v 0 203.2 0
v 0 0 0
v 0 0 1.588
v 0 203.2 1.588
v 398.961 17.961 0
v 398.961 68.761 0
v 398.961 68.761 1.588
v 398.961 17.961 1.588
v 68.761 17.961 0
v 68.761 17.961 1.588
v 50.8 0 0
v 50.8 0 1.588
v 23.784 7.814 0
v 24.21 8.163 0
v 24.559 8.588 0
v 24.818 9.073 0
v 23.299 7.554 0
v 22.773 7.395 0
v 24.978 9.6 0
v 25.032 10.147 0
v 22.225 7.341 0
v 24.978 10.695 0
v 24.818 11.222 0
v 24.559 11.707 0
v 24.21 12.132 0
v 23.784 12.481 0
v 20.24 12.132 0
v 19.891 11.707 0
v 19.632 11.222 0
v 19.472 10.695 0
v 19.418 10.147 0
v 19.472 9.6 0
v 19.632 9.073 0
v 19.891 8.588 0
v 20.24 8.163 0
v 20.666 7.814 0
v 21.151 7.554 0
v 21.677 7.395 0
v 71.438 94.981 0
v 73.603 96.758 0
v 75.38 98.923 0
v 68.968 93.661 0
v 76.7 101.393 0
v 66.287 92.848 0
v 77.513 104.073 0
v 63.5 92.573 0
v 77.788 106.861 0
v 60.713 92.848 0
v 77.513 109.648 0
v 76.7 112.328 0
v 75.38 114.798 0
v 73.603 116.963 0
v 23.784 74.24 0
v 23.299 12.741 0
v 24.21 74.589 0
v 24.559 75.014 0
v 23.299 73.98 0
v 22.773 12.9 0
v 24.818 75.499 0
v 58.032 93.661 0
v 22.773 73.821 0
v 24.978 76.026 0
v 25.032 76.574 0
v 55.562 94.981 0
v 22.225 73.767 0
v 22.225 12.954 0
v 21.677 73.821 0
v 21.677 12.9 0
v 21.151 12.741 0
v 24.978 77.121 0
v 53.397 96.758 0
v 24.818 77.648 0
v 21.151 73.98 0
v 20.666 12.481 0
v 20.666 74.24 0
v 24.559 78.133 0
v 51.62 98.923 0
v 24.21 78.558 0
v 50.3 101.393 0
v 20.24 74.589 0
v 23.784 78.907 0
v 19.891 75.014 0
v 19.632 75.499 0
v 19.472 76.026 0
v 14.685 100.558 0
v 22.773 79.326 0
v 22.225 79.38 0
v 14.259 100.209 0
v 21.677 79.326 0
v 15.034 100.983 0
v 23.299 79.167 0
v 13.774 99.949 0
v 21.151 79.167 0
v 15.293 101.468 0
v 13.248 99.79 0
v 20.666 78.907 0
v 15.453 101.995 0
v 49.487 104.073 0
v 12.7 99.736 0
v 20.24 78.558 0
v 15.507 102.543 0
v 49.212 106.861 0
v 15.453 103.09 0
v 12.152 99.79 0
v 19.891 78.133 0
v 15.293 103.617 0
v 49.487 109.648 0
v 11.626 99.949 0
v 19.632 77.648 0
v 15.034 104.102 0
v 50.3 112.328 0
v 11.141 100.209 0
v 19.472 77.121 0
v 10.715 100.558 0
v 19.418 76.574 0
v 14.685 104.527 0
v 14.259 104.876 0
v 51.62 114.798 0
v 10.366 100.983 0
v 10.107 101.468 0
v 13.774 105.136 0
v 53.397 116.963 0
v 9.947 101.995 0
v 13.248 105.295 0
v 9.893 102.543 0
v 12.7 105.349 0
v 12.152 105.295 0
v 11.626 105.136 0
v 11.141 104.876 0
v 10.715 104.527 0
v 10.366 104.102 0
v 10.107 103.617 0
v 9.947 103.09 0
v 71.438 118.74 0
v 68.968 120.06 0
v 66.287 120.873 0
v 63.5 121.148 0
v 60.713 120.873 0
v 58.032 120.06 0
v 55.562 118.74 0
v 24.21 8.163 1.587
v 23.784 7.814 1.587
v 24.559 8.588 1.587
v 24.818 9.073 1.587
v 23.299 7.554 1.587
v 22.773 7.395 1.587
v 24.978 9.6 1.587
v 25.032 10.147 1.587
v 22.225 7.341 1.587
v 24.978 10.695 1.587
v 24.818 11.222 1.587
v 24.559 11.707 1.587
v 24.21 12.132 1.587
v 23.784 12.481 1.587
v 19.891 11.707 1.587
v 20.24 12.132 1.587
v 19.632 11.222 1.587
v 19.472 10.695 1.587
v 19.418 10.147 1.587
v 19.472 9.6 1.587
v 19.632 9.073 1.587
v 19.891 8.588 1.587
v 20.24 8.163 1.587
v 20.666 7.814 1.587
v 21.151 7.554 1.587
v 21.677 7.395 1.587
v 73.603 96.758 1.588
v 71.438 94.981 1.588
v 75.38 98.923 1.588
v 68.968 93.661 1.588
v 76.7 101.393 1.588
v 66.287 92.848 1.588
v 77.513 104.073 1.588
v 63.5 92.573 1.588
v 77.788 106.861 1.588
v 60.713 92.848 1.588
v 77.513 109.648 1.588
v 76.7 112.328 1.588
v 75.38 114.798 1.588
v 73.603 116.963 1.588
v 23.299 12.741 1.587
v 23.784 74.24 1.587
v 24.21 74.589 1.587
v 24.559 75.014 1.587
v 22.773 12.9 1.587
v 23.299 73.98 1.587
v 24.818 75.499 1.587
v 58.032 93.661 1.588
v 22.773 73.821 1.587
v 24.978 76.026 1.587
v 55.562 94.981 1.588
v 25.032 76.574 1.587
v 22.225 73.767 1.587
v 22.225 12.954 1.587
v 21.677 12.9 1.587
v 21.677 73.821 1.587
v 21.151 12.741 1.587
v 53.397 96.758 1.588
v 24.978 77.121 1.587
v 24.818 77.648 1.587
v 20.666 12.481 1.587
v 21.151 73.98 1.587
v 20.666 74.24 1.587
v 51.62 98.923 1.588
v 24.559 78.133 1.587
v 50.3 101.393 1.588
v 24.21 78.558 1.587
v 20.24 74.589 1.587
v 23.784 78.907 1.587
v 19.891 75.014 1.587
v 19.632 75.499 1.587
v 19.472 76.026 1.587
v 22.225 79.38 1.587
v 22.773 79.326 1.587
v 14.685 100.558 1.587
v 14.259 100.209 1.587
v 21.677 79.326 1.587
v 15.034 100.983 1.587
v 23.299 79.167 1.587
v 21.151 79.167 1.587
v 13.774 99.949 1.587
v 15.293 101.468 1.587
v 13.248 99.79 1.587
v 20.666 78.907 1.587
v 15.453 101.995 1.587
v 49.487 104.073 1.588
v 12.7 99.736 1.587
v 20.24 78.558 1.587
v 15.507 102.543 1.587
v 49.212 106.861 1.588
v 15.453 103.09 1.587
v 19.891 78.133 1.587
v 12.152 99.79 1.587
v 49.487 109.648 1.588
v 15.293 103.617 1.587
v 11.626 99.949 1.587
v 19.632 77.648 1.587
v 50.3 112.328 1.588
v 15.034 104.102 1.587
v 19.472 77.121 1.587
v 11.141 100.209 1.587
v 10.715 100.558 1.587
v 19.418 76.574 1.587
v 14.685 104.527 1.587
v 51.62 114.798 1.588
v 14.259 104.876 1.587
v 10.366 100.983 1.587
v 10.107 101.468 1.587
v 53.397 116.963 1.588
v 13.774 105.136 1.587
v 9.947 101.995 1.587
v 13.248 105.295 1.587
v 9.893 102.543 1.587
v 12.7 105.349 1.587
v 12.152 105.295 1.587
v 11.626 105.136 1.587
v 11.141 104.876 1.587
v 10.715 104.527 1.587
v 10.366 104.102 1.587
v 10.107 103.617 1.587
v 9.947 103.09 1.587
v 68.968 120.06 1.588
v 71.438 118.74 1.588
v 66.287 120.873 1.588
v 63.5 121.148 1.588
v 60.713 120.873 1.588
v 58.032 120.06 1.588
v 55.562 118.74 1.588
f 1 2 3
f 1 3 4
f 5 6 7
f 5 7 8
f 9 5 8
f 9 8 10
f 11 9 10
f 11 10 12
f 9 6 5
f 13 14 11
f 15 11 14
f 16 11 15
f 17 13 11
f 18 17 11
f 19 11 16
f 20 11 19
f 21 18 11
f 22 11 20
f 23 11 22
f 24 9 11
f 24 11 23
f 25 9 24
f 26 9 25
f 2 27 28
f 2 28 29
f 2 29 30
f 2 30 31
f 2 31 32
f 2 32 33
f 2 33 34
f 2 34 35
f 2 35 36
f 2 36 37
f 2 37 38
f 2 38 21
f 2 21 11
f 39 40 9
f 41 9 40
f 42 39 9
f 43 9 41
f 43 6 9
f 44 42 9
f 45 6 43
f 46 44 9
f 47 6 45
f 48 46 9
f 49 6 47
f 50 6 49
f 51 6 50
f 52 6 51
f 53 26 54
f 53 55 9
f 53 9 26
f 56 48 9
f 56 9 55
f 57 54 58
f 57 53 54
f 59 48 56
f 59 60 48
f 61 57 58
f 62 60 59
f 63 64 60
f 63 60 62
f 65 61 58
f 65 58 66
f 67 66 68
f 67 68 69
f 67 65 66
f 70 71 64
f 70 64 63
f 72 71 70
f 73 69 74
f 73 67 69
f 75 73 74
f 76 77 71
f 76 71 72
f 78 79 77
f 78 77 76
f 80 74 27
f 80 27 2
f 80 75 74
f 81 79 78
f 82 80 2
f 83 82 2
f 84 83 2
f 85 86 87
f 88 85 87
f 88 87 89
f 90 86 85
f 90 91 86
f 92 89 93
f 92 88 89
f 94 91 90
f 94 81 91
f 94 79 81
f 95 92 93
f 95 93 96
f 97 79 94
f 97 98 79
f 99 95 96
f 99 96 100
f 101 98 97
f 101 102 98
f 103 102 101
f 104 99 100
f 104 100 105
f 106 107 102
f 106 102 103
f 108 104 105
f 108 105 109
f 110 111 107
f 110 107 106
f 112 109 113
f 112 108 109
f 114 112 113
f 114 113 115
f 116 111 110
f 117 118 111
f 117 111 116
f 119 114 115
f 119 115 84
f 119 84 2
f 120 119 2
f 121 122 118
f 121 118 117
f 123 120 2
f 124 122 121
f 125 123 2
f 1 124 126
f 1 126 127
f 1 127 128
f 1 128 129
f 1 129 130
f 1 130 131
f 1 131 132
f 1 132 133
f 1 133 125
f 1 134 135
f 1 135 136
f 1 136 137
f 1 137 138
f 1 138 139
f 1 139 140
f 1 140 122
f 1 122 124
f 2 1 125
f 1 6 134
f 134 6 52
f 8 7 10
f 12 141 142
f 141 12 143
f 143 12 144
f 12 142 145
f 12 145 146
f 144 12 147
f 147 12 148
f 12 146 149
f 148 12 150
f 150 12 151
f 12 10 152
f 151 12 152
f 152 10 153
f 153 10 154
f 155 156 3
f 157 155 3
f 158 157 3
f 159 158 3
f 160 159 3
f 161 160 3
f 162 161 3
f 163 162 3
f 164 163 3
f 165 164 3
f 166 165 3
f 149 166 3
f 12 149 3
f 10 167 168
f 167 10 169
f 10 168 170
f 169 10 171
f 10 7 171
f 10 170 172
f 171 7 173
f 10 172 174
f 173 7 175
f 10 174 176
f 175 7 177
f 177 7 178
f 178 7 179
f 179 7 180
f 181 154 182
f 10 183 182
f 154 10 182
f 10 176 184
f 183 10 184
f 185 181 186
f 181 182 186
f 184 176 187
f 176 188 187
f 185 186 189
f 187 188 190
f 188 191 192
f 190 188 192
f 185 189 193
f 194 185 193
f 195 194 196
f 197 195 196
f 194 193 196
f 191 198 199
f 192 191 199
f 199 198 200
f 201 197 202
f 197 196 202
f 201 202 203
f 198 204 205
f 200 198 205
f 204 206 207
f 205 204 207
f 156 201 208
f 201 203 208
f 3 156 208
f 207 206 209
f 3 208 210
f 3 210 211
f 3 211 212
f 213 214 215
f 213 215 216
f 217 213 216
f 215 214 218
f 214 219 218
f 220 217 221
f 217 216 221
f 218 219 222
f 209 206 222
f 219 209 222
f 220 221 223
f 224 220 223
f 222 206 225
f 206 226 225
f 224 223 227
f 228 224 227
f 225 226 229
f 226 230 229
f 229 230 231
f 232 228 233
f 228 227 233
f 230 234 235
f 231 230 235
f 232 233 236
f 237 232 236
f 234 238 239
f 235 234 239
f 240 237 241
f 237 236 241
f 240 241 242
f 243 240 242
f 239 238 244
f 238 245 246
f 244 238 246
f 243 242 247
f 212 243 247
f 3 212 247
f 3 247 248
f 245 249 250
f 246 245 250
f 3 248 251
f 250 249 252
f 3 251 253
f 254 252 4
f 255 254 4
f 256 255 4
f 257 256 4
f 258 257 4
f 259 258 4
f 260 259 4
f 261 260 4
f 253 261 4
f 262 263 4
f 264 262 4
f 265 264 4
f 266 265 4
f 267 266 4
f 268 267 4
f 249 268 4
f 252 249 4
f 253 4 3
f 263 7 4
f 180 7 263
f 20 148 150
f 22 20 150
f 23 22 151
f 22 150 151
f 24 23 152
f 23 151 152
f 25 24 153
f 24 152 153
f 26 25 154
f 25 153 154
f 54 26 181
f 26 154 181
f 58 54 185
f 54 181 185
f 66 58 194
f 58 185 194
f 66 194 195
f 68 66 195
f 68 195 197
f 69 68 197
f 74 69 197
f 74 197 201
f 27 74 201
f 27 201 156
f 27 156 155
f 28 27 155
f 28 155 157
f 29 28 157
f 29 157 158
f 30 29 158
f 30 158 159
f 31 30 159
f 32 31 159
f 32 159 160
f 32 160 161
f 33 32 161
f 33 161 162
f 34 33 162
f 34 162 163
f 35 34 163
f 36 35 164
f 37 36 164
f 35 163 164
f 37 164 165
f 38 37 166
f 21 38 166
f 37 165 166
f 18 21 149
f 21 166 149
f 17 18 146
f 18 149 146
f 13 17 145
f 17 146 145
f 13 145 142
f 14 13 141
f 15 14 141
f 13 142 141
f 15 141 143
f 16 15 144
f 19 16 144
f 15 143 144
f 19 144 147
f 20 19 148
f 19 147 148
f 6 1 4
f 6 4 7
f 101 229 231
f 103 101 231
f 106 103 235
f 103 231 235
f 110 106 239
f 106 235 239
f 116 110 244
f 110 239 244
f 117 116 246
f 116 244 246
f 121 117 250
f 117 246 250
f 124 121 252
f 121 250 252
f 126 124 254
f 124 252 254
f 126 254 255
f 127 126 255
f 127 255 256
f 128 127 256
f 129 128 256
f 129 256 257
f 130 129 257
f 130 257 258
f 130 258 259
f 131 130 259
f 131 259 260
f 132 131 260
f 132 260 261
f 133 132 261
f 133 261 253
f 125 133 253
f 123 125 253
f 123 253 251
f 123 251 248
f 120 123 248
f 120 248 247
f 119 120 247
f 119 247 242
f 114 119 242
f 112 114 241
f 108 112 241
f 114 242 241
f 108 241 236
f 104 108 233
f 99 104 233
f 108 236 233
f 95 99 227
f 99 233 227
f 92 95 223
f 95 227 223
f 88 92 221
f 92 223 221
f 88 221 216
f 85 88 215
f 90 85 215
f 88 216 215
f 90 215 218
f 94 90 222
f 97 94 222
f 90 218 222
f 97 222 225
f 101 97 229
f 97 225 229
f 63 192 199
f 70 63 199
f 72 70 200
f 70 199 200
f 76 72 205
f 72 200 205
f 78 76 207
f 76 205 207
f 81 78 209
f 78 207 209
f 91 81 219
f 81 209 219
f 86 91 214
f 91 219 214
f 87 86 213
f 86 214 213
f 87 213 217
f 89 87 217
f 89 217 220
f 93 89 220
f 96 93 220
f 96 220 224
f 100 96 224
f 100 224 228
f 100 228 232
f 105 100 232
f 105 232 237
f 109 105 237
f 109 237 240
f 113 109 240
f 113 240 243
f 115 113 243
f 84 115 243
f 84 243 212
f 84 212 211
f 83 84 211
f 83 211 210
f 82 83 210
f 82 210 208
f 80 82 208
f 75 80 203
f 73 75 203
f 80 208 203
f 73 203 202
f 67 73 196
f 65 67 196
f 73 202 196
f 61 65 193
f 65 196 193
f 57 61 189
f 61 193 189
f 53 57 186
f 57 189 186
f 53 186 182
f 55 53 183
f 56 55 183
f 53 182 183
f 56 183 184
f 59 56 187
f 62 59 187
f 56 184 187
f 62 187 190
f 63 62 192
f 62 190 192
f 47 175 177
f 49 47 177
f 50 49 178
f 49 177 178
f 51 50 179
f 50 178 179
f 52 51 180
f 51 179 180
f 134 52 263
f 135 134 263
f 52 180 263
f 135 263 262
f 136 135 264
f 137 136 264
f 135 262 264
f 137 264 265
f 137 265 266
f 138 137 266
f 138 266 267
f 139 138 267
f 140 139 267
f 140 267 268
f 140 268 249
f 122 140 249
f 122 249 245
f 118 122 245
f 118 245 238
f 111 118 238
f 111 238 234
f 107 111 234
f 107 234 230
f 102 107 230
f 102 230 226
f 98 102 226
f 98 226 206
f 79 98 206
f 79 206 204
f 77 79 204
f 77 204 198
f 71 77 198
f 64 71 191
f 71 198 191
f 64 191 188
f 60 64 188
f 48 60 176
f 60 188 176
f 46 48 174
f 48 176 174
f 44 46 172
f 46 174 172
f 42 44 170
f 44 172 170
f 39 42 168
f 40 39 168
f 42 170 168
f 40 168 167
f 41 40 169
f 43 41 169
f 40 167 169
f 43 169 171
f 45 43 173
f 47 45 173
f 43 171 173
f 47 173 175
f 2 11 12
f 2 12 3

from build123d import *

# Parameters (mm, degrees)
BOSS_EXTRUDE1_DEPTH    = 1.5875
F_10_CLEARANCE_HOLE1_D = 5.6134
SKETCH5_R              = 14.2875
CUT_EXTRUDE1_DEPTH     = 448.730108977


with BuildPart() as part:
    # Sketch1 → Boss-Extrude1 (new body)
    with BuildSketch(Plane.XY):
        Polygon((0, 0), (0, 203.2), (398.960512242, 68.760512242), (398.960512242, 17.960512242), (68.760512242, 17.960512242), (50.8, 0), align=None)
    extrude(amount=BOSS_EXTRUDE1_DEPTH)

    # #10 Clearance Hole1 (through all)
    with Locations(Plane(origin=(0, 0, 0), x_dir=(-1, 0, 0), z_dir=(0, 0, -1))):
        with Locations((-12.7, 102.542512242), (-22.225, 76.573552108), (-22.225, 10.147472376)):
            Hole(F_10_CLEARANCE_HOLE1_D / 2)

    # Sketch5 → Cut-Extrude1 (cut, through all)
    with BuildSketch(Plane.XY.offset(1.5875)):
        with Locations((63.5, 106.860512242)):
            Circle(SKETCH5_R)
    extrude(amount=-CUT_EXTRUDE1_DEPTH, mode=Mode.SUBTRACT)


solid = part.part
